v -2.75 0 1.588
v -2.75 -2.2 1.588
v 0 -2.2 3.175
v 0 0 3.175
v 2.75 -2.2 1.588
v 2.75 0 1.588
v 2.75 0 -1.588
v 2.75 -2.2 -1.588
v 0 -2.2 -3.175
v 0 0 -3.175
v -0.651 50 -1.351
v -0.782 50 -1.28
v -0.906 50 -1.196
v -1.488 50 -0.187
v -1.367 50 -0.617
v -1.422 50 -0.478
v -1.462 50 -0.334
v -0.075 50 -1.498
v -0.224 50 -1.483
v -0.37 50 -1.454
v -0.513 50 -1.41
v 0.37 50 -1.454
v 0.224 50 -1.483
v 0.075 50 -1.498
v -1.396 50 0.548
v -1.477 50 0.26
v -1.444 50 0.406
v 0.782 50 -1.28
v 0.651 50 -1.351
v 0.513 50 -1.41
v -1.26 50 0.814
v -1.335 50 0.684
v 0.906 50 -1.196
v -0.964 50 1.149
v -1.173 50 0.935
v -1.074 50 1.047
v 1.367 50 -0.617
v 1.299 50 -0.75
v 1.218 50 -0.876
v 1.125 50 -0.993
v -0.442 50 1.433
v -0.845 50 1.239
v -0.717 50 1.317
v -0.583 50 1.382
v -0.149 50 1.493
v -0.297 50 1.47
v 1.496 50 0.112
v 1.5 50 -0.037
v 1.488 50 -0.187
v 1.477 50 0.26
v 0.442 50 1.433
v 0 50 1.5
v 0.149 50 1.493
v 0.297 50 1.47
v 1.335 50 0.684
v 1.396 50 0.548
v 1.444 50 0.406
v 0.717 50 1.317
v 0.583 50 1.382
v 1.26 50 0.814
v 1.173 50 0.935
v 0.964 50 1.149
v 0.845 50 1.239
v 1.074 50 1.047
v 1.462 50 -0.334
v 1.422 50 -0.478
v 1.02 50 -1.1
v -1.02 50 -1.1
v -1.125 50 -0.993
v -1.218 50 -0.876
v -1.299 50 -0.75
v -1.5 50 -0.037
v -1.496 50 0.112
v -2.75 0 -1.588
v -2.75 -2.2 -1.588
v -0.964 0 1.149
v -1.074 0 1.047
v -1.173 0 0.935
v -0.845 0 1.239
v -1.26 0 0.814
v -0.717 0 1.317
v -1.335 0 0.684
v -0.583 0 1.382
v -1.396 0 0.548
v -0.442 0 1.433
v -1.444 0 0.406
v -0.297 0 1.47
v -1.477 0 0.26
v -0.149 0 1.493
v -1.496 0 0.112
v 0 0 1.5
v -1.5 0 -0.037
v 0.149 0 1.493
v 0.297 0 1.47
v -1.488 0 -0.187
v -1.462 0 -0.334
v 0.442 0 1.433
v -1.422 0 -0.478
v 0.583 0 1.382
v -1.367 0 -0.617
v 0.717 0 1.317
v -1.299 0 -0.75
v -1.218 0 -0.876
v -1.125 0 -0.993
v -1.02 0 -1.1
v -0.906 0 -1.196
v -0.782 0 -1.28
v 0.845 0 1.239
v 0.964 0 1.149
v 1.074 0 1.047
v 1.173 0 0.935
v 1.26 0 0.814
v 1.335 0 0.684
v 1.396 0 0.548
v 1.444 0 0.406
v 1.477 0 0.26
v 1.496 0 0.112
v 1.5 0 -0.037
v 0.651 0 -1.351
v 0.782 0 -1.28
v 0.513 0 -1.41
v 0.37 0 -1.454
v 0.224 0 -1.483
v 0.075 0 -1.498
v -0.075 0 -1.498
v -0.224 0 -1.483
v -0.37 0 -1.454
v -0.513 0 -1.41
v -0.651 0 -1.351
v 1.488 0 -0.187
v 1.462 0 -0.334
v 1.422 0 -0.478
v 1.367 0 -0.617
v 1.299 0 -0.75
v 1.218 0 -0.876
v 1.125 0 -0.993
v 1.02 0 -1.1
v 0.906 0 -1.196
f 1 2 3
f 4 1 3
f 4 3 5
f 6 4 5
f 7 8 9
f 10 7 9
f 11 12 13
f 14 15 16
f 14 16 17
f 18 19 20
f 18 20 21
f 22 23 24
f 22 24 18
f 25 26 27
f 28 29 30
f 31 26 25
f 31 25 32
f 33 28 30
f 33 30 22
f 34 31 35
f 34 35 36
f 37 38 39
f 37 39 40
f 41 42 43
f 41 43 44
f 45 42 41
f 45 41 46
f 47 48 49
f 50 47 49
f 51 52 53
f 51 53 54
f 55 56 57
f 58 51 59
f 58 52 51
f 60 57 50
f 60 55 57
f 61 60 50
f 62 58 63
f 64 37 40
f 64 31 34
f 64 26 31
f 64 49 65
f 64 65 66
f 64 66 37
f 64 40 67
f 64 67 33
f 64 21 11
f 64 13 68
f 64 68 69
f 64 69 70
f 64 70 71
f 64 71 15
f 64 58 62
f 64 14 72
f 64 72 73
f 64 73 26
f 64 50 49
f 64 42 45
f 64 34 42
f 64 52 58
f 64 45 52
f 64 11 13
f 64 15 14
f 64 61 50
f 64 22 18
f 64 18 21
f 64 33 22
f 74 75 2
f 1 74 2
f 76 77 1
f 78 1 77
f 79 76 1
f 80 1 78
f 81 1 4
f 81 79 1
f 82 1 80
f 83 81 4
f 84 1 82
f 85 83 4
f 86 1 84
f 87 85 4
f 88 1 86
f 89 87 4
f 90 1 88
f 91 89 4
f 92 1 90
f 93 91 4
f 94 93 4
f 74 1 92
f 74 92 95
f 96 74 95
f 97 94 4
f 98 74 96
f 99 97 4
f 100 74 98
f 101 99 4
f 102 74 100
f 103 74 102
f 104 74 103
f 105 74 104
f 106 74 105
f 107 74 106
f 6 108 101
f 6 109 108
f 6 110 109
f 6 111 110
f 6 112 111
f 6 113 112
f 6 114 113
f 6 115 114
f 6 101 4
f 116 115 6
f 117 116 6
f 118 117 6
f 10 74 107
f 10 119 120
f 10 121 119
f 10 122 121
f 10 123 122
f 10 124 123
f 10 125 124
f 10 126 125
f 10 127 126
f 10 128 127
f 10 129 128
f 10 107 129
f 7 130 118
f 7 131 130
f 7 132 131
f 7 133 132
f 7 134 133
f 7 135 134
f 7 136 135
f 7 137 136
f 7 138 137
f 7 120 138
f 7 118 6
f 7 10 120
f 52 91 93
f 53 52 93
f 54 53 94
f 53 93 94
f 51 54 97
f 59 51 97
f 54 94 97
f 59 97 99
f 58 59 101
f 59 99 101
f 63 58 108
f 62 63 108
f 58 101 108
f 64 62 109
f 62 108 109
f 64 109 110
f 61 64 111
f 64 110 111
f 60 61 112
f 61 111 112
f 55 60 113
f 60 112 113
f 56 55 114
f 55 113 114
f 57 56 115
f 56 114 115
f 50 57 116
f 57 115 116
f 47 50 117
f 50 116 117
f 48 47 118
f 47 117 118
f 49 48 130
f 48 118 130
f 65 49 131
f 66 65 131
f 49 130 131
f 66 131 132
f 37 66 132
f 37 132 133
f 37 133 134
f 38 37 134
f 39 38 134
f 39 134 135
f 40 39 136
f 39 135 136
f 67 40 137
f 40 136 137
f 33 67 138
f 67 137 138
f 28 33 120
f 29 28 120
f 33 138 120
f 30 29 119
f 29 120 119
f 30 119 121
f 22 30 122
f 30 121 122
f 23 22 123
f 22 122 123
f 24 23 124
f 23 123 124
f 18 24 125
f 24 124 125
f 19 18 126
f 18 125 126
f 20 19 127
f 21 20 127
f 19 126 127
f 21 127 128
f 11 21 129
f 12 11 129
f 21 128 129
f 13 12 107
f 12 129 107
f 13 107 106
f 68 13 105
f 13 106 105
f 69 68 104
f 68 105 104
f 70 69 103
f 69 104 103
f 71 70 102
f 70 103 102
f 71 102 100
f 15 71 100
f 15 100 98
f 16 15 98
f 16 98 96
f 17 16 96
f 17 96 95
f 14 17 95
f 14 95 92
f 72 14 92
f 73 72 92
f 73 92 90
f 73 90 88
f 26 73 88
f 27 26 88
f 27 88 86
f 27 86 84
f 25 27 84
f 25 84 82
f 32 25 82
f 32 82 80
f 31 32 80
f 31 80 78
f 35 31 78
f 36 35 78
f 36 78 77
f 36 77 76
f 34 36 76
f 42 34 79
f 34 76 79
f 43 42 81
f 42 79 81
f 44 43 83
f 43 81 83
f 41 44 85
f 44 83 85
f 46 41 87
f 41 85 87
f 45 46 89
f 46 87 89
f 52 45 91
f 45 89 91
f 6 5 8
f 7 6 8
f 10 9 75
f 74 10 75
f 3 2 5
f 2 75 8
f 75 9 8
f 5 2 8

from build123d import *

# Parameters (mm, degrees)
SKETCH_1_R      = 1.5
EXTRUDE_3_DEPTH = 50
EXTRUDE_4_DEPTH = 2.2


with BuildPart() as part:
    # 草图1 → 凸台-拉伸3 (new body)
    with BuildSketch(Plane(origin=(0, 0, 0), x_dir=(1, 0, 0), z_dir=(0, 1, 0))):
        Circle(SKETCH_1_R)
    extrude(amount=EXTRUDE_3_DEPTH)

    # 草图1<4> → 凸台-拉伸4 (add)
    with BuildSketch(Plane(origin=(0, 0, 0), x_dir=(1, 0, 0), z_dir=(0, 1, 0))):
        Polygon((-2.75, -1.58771324), (0, -3.175426481), (2.75, -1.58771324), (2.75, 1.58771324), (0, 3.175426481), (-2.75, 1.58771324), align=None)
    extrude(amount=-EXTRUDE_4_DEPTH)


solid = part.part
